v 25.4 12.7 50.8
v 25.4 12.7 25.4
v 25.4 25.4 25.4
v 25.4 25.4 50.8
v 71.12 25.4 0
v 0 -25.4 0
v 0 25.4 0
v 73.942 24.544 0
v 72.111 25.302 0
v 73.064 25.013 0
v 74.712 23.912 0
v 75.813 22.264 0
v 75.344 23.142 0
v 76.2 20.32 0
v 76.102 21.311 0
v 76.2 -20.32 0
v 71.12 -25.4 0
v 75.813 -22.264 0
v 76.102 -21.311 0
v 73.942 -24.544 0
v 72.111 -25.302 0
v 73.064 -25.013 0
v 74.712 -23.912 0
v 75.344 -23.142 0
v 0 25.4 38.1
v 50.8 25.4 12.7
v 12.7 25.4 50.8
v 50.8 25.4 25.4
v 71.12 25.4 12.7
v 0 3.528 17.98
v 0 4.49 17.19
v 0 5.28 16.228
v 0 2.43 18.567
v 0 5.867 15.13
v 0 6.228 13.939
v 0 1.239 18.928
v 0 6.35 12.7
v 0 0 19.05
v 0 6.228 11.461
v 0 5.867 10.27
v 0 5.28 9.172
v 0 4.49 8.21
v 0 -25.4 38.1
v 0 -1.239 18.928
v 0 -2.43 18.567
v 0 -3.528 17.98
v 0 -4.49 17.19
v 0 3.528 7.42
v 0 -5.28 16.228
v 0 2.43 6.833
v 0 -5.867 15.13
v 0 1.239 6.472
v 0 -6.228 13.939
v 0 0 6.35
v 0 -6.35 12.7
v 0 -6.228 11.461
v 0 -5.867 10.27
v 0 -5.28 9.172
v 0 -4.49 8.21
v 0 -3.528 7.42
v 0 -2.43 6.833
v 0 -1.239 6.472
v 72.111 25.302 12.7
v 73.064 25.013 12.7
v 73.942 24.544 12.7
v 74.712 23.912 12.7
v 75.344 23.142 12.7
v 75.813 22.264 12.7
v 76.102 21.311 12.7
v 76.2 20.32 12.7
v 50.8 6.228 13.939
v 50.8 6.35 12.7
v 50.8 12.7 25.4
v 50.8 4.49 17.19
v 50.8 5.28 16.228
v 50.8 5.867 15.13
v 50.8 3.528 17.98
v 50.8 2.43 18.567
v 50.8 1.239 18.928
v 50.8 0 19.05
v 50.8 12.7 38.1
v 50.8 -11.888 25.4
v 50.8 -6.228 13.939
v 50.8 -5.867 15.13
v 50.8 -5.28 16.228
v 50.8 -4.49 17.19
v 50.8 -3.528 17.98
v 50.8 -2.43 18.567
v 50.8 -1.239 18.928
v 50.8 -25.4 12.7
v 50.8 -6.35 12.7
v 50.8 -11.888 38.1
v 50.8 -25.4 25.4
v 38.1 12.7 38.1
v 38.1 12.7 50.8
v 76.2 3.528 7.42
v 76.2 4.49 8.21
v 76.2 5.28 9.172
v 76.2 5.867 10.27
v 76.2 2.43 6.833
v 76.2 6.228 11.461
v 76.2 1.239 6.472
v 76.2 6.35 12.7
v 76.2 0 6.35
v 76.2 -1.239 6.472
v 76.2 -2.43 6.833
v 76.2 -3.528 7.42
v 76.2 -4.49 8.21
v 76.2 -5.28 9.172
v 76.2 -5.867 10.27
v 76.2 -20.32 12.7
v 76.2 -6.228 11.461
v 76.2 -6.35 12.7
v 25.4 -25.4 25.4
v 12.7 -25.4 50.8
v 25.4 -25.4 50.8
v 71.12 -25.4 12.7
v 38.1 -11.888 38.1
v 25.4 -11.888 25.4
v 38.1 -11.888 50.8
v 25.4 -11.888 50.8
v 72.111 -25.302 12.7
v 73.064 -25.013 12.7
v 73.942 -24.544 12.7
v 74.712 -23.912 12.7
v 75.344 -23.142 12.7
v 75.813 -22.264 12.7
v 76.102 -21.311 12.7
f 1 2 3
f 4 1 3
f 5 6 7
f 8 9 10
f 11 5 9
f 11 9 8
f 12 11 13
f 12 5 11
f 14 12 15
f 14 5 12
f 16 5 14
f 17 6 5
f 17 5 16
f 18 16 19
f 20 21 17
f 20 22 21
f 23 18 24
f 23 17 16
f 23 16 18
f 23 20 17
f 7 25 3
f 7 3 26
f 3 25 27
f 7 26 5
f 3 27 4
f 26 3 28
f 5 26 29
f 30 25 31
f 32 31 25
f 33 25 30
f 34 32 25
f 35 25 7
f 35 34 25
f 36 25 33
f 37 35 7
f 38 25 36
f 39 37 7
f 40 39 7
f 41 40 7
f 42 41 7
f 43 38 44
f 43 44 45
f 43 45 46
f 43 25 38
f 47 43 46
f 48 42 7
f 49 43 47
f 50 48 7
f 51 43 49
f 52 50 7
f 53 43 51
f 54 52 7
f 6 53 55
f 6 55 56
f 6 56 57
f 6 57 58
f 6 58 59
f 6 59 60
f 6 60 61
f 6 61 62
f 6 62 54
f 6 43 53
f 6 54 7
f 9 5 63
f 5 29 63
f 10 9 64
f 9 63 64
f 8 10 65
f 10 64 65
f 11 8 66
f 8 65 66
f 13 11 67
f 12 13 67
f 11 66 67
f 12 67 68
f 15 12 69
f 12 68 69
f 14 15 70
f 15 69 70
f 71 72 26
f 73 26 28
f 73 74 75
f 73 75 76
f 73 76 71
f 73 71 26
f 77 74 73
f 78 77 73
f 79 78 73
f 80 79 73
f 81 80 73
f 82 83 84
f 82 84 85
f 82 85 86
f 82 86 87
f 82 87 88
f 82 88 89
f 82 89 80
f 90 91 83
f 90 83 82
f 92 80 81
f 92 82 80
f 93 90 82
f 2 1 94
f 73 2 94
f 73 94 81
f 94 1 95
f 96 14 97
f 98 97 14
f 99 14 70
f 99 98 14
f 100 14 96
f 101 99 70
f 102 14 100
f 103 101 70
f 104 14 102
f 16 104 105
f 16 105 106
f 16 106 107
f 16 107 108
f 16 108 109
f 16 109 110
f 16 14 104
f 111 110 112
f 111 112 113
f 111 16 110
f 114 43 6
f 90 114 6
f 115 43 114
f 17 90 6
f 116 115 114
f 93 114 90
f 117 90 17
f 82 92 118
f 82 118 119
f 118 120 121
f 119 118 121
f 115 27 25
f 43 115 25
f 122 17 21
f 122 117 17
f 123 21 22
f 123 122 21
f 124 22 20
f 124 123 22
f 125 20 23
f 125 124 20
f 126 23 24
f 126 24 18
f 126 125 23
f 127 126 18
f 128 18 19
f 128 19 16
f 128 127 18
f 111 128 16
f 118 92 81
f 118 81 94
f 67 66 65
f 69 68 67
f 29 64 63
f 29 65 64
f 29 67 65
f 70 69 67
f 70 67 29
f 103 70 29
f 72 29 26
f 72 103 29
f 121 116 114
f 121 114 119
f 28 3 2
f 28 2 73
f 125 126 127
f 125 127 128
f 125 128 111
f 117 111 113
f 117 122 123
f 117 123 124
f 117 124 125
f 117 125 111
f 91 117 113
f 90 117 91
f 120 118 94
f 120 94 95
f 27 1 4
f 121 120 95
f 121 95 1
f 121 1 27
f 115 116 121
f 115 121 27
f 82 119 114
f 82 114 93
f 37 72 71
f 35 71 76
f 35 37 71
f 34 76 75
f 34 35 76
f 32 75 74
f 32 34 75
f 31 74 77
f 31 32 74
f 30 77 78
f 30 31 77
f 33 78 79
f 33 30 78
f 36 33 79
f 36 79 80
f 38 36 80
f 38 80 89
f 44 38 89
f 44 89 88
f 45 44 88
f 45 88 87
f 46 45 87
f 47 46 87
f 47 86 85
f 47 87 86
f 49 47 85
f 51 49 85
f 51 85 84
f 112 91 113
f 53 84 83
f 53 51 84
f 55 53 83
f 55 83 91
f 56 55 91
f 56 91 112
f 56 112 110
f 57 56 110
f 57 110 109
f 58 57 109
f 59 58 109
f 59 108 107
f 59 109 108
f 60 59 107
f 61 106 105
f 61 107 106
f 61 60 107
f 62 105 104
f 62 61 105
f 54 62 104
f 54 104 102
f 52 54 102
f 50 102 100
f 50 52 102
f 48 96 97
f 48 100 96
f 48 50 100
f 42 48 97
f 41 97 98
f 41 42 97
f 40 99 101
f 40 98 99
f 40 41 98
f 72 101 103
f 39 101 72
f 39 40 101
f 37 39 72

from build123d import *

# Parameters (mm, degrees)
F1_DEPTH = 25.4
F2_W     = 12.7
F2_H     = 12.7
F2_H_2   = 13.5122093648
F3_DEPTH = 25.4
F4_R     = 6.35
F5_DEPTH = 76.201
F6_R     = 5.08


with BuildPart() as f1:
    # F0 (on Front) → F1 (new body, symmetric)
    with BuildSketch(Plane.XZ):
        Polygon((0, 38.1), (0, 0), (76.2, 0), (76.2, 12.7), (50.8, 12.7), (50.8, 25.4), (25.4, 25.4), (25.4, 50.8), (12.7, 50.8), align=None)
        Polygon((38.1, 50.8), (25.4, 50.8), (25.4, 25.4), (50.8, 25.4), (50.8, 38.1), (38.1, 38.1), align=None)
    extrude(amount=F1_DEPTH, both=True)

    # F2 (on face) → F3 (cut)
    with BuildSketch(Plane.XY.offset(50.8)):
        with Locations((44.45, 19.05)):
            Rectangle(F2_W, F2_H)
        with Locations((31.75, 19.05)):
            Rectangle(F2_W, F2_H)
        with Locations((31.75, -18.6438953176)):
            Rectangle(F2_W, F2_H_2)
        with Locations((44.45, -18.6438953176)):
            Rectangle(F2_W, F2_H_2)
    extrude(amount=-F3_DEPTH, mode=Mode.SUBTRACT)

    # F4 (on Right) → F5 (cut, through all)
    with BuildSketch(Plane.YZ):
        with Locations((0, 12.7)):
            Circle(F4_R)
    extrude(amount=F5_DEPTH, mode=Mode.SUBTRACT)

    # F6
    f6_edges = [f1.edges().sort_by_distance(p)[0] for p in [
        (76.2, -25.4, 6.35),
        (76.2, 25.4, 6.35),
    ]]
    fillet(f6_edges, radius=F6_R)


solid = f1.part
